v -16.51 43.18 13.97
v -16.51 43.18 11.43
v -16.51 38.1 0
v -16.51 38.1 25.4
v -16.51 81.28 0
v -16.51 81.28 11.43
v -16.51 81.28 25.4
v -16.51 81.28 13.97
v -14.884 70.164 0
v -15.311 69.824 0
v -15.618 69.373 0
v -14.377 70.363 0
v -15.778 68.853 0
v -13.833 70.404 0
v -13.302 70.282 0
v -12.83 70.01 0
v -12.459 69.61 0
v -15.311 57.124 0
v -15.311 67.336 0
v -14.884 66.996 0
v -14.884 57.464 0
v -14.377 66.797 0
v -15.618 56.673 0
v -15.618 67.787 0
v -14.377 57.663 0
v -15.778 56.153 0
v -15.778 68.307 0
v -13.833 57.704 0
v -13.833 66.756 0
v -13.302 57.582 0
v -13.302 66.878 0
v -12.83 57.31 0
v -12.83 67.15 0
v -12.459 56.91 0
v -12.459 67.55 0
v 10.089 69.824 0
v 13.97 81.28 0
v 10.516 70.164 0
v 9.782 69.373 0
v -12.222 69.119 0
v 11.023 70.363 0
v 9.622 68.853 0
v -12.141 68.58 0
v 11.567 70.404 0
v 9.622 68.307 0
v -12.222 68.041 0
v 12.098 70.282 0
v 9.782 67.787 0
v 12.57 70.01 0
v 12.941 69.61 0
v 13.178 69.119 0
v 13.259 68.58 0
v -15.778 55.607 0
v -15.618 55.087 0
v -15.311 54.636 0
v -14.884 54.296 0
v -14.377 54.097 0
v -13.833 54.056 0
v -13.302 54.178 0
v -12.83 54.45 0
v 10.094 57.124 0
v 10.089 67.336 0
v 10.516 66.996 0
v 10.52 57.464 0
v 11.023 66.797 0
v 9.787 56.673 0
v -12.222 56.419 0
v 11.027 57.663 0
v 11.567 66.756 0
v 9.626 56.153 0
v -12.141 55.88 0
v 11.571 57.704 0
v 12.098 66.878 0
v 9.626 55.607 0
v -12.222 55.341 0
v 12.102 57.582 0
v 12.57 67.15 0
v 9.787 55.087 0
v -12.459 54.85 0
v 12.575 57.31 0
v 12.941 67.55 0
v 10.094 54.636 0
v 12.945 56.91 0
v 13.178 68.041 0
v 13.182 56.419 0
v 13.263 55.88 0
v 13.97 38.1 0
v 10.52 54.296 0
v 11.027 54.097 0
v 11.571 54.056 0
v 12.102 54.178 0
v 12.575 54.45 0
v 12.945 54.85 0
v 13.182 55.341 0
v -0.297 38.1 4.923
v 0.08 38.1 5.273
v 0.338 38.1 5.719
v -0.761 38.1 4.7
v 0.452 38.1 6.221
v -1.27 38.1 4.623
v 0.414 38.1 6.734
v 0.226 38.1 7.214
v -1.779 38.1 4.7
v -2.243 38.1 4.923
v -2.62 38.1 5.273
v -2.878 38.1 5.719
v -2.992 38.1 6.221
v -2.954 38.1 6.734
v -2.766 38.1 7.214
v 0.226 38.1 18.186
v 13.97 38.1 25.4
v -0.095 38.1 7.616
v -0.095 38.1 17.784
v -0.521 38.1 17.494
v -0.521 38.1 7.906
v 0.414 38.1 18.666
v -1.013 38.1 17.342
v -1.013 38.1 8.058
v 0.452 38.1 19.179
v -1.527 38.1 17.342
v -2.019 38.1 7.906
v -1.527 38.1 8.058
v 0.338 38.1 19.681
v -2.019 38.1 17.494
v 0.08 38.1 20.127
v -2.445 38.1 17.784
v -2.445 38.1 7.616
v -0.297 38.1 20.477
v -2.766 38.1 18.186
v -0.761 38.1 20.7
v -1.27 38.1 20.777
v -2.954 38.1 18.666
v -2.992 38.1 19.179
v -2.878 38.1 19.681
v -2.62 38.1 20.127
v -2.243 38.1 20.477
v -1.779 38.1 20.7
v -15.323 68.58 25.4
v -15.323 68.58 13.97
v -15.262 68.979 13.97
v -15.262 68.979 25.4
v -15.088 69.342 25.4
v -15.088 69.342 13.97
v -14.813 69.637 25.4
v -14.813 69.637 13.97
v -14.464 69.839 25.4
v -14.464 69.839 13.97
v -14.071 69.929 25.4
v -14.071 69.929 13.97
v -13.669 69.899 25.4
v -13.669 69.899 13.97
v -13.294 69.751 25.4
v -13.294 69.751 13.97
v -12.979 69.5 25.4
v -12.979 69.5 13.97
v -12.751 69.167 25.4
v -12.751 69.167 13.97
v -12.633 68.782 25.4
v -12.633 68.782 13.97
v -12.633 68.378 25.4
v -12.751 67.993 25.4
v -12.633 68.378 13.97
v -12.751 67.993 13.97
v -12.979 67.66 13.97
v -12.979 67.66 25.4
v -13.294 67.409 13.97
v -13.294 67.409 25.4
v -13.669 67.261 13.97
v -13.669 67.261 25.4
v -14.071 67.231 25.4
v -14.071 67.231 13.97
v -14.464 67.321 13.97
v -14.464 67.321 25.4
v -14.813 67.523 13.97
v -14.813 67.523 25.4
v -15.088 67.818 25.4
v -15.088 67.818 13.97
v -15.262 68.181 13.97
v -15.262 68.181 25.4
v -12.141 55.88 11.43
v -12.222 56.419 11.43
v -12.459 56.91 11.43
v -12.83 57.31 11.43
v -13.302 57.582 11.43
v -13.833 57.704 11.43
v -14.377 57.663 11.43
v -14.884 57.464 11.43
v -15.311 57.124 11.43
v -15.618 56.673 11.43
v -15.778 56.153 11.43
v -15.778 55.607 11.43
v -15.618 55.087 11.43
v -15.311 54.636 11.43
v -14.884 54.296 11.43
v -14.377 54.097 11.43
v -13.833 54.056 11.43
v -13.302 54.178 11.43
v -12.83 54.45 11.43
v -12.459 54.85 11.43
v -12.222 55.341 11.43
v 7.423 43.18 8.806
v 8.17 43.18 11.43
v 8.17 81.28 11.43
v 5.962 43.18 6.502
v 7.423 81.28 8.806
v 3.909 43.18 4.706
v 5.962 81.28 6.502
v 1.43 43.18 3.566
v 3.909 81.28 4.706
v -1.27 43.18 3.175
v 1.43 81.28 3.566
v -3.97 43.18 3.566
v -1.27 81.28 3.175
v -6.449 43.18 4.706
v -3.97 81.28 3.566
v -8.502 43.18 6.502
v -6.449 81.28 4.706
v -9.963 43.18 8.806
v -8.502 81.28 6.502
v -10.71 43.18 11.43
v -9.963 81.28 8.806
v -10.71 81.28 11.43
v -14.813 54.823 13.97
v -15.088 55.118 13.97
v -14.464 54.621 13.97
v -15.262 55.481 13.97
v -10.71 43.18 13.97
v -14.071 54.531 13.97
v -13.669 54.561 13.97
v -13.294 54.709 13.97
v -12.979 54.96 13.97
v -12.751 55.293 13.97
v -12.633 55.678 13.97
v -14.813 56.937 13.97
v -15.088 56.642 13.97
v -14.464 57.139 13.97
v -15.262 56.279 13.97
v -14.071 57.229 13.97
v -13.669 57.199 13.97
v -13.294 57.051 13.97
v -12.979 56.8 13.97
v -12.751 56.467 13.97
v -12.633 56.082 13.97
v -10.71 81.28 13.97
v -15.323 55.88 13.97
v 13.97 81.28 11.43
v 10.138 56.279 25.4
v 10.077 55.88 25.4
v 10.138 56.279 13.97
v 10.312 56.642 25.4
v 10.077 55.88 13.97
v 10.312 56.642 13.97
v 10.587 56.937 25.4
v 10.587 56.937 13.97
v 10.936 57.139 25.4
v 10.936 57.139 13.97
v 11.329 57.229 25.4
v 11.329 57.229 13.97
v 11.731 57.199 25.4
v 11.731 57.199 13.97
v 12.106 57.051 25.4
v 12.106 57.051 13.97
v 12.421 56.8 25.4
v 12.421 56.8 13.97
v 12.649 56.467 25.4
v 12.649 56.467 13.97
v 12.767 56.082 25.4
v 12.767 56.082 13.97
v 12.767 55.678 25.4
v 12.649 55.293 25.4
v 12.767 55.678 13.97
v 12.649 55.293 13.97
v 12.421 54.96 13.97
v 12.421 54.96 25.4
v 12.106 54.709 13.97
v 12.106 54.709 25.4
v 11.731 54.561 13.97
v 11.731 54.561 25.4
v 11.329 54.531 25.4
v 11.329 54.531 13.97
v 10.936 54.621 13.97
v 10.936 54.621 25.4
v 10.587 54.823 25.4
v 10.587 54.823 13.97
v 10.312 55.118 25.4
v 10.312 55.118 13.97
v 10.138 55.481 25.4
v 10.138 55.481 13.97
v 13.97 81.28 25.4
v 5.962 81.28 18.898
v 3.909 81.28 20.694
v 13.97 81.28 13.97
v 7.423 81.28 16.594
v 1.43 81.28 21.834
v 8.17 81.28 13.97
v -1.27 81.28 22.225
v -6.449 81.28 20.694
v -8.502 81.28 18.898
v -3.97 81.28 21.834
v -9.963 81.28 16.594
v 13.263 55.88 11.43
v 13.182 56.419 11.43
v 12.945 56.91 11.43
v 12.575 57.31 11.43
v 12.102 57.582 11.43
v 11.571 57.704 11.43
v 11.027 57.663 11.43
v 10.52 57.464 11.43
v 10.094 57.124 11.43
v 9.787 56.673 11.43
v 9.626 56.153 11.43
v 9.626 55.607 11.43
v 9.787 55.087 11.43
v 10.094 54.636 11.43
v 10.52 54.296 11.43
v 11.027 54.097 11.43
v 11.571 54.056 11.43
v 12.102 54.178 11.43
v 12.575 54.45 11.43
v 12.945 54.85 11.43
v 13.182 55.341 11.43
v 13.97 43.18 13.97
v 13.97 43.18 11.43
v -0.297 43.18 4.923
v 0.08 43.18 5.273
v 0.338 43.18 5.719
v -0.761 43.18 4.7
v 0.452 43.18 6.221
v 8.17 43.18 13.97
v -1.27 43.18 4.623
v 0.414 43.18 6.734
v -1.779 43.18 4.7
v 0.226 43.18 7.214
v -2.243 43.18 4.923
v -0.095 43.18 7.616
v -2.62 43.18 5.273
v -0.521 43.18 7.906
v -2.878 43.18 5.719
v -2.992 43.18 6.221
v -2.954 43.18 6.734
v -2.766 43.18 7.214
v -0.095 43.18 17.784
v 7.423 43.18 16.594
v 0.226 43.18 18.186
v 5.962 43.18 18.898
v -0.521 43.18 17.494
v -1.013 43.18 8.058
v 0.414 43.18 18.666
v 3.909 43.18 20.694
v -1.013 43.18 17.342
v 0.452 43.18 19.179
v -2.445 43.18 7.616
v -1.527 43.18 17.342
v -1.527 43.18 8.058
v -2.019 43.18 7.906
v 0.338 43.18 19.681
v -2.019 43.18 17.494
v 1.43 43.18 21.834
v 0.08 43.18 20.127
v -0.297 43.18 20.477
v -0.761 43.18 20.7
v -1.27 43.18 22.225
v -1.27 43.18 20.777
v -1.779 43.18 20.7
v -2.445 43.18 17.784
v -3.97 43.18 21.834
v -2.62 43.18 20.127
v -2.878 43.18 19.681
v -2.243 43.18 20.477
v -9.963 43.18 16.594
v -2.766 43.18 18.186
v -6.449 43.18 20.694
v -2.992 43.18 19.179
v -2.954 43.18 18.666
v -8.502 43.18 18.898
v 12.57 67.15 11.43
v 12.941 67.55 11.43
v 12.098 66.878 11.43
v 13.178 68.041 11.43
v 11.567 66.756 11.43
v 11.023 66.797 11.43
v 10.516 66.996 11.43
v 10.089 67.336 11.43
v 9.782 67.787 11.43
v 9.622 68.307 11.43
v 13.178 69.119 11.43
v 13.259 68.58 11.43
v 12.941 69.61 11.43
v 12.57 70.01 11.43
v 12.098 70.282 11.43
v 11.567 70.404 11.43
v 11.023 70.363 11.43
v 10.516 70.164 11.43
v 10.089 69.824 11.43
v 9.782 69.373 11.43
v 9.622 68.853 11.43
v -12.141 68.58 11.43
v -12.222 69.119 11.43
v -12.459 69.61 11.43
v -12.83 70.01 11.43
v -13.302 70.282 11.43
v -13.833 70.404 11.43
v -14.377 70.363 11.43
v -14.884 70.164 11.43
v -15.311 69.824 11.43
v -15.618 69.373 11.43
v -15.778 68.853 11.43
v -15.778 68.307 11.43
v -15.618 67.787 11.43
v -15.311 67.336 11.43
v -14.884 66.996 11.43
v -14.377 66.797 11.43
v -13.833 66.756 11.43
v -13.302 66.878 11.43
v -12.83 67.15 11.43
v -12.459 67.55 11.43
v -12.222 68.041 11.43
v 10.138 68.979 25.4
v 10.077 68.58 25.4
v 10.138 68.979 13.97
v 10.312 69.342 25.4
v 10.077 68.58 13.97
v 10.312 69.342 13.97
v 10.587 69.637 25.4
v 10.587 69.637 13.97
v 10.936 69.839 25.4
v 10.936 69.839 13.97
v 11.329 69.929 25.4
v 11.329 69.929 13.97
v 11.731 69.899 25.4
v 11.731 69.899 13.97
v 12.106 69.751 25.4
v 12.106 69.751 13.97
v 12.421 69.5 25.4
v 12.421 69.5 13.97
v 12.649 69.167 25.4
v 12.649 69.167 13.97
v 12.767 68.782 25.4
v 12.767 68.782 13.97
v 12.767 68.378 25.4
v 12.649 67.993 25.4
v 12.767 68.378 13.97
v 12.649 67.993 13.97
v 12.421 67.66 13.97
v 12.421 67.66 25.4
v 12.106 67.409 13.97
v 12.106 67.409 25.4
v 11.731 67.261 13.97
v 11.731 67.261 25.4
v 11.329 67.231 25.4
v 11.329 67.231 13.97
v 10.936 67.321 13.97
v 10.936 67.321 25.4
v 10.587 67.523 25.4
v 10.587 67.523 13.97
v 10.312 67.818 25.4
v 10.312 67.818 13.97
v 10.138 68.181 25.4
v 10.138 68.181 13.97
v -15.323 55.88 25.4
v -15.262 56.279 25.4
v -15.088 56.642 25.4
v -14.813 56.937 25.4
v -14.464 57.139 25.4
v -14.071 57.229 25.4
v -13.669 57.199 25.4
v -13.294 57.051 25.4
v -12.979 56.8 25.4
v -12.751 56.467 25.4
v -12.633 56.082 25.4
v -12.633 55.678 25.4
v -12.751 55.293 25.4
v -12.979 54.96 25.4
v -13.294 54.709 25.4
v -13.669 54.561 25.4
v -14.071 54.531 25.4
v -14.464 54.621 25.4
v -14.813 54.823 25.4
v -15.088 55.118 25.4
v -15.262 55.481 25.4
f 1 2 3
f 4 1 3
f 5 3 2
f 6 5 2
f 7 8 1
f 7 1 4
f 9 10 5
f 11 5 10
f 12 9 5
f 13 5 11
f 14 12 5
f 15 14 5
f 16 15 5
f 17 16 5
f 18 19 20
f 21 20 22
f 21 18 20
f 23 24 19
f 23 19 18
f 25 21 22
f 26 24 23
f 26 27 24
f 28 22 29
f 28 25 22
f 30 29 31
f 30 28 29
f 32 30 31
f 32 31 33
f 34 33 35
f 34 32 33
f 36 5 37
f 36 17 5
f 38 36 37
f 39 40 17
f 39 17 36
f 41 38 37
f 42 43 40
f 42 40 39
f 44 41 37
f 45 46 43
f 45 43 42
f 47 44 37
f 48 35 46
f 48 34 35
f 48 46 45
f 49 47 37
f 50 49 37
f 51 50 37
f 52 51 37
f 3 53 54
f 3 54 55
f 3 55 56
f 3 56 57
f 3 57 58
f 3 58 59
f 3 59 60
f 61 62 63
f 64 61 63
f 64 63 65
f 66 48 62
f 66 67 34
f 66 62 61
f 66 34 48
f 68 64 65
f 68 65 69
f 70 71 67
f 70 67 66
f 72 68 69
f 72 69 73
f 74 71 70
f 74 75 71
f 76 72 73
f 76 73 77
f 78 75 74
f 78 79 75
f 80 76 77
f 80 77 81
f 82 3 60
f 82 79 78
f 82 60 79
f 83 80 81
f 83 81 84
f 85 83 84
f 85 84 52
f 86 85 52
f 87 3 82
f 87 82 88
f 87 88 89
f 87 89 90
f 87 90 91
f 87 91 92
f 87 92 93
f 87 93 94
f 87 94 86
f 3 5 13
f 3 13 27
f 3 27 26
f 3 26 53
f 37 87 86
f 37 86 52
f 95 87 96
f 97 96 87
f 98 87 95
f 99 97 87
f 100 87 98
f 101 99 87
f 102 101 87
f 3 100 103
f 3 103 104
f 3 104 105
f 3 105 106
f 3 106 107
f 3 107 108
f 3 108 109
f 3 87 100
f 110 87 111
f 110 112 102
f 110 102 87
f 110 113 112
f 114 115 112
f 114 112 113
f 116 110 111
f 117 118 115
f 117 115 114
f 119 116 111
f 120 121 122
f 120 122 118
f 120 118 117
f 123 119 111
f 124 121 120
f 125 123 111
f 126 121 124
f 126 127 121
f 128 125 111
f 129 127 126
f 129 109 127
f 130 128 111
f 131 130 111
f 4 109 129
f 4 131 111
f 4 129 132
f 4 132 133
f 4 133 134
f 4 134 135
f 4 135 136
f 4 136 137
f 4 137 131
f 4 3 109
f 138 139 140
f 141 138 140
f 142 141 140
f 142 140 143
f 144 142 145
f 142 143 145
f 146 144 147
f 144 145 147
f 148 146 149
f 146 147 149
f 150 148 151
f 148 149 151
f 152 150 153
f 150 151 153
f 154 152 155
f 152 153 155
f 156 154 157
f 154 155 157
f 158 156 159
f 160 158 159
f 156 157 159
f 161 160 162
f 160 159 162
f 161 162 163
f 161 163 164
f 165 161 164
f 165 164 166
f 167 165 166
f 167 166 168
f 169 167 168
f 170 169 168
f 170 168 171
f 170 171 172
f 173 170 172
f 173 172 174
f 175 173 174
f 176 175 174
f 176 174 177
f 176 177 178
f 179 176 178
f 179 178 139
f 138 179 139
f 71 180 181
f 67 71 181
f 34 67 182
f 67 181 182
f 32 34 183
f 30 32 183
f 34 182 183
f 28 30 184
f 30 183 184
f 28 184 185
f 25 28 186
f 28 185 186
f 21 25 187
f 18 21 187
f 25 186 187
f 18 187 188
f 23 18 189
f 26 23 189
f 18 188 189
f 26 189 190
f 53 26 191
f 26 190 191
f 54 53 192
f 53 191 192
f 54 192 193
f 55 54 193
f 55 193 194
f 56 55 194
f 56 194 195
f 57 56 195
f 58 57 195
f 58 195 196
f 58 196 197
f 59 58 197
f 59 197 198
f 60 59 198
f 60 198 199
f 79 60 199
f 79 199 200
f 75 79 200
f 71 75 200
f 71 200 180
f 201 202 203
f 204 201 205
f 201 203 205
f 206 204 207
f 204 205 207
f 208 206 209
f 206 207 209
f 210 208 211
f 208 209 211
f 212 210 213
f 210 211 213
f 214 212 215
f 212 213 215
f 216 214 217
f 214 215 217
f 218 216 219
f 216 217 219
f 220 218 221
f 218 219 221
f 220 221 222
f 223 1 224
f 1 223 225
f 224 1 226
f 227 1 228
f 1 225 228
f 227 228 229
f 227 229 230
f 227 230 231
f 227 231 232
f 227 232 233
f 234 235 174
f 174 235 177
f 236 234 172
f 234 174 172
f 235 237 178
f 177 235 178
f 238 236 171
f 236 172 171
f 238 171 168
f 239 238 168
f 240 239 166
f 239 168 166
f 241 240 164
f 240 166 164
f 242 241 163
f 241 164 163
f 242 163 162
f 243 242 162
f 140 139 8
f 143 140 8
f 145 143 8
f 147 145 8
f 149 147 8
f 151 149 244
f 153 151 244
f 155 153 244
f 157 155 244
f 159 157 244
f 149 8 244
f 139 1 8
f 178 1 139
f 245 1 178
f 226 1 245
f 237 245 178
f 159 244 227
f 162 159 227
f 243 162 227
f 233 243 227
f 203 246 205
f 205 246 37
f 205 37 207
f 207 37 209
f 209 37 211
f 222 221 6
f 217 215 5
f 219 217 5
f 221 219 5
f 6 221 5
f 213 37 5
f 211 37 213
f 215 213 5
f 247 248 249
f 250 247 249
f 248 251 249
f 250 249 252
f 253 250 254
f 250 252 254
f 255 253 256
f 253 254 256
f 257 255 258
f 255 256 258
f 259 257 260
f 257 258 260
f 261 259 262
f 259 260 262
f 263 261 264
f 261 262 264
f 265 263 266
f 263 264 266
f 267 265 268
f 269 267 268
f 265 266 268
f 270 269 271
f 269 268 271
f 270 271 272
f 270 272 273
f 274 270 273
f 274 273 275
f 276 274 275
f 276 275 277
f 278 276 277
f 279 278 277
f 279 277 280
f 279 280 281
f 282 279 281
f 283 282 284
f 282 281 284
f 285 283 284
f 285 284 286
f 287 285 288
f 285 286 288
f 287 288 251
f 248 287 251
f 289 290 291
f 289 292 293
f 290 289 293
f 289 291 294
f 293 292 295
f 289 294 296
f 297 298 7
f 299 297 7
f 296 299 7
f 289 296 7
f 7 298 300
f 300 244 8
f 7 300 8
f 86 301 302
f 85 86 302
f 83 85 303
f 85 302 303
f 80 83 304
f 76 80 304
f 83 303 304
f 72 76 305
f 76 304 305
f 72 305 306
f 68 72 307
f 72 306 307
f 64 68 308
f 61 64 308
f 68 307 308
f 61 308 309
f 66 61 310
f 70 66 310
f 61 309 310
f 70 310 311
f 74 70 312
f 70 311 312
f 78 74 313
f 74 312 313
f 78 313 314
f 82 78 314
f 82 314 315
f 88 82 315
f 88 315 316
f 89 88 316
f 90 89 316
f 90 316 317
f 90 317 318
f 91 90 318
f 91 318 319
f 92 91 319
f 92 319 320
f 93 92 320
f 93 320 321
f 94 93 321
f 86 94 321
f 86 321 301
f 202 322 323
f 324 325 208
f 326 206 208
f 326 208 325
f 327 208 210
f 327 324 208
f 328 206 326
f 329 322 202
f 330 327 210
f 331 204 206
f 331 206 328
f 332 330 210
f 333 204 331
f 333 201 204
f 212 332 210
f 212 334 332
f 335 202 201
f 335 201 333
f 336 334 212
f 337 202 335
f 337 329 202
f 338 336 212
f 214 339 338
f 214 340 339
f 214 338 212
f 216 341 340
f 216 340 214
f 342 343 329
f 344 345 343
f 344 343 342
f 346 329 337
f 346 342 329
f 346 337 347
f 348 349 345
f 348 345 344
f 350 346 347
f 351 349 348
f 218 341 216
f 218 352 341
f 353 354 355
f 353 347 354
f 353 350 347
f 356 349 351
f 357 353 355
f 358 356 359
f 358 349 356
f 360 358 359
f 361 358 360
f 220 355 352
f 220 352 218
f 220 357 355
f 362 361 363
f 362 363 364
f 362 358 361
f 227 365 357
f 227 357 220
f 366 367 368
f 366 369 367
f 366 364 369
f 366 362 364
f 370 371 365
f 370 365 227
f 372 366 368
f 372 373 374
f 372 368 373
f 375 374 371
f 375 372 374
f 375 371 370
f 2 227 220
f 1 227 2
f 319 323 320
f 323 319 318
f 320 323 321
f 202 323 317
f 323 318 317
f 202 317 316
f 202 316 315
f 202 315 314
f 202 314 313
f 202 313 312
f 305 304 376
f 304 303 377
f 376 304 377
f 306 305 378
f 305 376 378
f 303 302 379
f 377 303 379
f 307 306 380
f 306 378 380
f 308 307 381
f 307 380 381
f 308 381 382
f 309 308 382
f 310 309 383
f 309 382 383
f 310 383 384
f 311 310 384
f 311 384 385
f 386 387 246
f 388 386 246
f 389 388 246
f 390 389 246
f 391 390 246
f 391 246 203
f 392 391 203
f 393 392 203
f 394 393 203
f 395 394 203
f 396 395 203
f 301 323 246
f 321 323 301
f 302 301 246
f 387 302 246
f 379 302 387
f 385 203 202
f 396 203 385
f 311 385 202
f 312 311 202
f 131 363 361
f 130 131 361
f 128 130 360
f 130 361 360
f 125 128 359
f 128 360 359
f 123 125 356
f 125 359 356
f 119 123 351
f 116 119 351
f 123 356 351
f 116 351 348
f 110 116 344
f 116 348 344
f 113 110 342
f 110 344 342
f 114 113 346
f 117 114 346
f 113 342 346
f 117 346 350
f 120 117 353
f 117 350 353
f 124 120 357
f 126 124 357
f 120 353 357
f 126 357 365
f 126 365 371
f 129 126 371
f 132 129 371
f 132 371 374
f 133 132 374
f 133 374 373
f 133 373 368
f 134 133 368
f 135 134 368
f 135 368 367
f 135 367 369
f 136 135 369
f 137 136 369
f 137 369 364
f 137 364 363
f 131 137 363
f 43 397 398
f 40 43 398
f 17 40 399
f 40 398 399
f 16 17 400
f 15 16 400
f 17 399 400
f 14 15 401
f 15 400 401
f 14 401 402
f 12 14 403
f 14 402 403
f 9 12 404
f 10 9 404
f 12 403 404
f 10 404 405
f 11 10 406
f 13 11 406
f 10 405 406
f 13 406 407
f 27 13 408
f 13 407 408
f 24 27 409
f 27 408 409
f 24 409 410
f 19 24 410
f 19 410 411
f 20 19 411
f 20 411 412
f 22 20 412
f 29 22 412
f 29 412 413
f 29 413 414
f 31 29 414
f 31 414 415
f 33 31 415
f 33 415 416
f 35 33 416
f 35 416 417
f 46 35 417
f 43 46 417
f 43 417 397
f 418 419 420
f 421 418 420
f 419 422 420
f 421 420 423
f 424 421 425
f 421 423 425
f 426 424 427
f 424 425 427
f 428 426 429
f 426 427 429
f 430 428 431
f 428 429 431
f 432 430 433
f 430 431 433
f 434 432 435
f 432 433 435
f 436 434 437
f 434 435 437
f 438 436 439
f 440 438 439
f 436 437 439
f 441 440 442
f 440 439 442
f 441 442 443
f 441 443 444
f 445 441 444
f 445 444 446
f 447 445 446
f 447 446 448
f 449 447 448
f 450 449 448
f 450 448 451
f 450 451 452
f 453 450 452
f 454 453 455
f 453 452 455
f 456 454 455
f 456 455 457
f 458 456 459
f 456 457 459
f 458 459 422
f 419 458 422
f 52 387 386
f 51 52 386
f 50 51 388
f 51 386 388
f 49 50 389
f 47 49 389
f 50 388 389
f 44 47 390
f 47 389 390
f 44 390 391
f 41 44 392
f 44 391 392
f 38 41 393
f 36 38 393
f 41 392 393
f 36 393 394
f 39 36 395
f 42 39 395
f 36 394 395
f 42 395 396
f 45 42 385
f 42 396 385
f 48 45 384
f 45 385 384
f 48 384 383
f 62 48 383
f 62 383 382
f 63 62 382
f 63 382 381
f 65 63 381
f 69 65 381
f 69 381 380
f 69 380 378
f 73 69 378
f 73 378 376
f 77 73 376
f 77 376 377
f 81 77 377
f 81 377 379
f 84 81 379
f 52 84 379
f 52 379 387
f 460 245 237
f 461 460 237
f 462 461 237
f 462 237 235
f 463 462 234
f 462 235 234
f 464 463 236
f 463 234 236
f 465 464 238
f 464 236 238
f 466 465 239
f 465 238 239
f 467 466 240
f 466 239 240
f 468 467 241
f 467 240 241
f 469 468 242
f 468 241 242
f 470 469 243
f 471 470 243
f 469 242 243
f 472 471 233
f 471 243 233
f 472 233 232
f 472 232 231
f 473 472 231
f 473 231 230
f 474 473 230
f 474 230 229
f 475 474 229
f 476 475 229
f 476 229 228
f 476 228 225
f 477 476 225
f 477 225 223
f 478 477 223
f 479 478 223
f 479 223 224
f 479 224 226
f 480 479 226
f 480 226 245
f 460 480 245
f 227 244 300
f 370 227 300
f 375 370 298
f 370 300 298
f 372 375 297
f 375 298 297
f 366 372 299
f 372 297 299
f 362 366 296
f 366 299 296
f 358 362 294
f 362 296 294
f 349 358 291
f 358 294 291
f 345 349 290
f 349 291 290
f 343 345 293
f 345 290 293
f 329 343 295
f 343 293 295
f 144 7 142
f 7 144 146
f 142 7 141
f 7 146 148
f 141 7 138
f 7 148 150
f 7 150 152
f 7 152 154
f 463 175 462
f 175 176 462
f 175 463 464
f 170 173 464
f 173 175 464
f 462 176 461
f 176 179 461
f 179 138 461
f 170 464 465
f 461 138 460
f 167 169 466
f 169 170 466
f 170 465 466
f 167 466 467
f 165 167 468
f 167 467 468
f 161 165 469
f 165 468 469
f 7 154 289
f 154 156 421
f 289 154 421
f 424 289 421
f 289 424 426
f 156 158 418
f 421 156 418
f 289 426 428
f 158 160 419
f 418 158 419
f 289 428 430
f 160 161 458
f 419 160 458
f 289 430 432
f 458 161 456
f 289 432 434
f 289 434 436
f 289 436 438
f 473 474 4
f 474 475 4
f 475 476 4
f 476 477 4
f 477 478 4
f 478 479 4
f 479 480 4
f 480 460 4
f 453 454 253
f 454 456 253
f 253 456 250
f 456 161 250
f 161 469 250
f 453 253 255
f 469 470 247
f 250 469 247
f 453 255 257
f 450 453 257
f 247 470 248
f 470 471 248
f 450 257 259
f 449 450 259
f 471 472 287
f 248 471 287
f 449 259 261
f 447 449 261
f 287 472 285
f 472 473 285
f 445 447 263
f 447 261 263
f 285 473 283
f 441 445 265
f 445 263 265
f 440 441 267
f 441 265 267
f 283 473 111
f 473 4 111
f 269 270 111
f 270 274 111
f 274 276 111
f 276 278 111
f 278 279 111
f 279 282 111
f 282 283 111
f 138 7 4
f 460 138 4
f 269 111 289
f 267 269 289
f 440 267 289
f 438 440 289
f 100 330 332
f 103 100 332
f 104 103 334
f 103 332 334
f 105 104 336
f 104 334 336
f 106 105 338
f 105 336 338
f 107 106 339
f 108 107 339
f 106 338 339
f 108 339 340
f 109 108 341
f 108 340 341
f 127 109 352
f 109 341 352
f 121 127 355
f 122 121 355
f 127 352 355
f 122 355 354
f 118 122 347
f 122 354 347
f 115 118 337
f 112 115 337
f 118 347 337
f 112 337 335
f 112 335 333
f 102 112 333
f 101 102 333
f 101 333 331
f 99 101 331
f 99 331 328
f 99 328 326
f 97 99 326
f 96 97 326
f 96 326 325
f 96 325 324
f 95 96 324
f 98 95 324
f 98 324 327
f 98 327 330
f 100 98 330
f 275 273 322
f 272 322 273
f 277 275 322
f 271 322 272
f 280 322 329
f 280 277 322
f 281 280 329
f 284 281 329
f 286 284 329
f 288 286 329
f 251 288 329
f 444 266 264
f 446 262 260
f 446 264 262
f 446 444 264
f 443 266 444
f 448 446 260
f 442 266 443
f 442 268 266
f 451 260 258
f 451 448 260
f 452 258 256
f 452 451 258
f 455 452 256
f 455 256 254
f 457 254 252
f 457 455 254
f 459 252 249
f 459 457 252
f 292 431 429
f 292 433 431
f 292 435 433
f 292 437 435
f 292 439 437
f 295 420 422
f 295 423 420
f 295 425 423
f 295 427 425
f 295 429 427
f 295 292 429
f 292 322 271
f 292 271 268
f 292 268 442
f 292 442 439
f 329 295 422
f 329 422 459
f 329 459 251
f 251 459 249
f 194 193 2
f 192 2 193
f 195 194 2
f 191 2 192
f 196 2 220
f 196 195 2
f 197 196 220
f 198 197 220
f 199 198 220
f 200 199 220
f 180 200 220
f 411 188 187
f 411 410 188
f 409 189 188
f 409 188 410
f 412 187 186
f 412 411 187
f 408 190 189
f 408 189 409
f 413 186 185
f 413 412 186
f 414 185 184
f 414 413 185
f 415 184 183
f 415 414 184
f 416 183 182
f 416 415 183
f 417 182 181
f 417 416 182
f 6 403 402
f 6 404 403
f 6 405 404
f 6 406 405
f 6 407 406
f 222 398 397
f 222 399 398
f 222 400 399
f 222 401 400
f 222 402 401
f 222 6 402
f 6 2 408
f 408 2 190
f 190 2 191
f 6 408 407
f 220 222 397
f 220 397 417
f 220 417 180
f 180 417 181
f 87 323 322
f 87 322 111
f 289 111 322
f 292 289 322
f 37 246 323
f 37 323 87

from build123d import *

# Parameters (mm, degrees)
SKETCH1_W                       = 55.88
SKETCH1_H                       = 25.4
EXTRUDE1_DEPTH                  = 101.6
SKETCH4_R                       = 9.525
CUT_EXTRUDE2_DEPTH              = 58.42
SKETCH7_W                       = 25.4
SKETCH7_H                       = 101.6
CUT_EXTRUDE5_DEPTH              = 12.7
SKETCH8_W                       = 25.4
SKETCH8_H                       = 101.6
CUT_EXTRUDE6_DEPTH              = 12.7
SKETCH15_W                      = 5.800046345
SKETCH15_H                      = 2.54
CUT_EXTRUDE10_DEPTH             = 58.42
F_27_0_144_DIAMETER_HOLE1_D     = 3.6576
F_27_0_144_DIAMETER_HOLE1_DEPTH = 13.97
F_27_0_144_DIAMETER_HOLE2_D     = 3.6576
F_27_0_144_DIAMETER_HOLE2_DEPTH = 13.97
F_6_32_TAPPED_HOLE1_D           = 2.7051
F_6_32_TAPPED_HOLE1_DEPTH       = 11.43
F_6_32_TAPPED_HOLE1_TIP         = 0.81269403
F_6_32_TAPPED_HOLE2_D           = 2.7051
F_6_32_TAPPED_HOLE2_DEPTH       = 11.43
F_6_32_TAPPED_HOLE2_TIP         = 0.81269403
SKETCH37_W                      = 25.4
SKETCH37_H                      = 38.1
CUT_EXTRUDE11_DEPTH             = 114.279443855
F_8_32_TAPPED_HOLE3_D           = 3.4544
CIRPATTERN2_COUNT               = 2
SKETCH44_W                      = 30.48
SKETCH44_H                      = 20.32
CUT_EXTRUDE12_DEPTH             = 107.02028155
CIRPATTERN3_COUNT               = 2
F_6_32_TAPPED_HOLE3_D           = 2.7051
F_6_32_TAPPED_HOLE3_DEPTH       = 13.97
F_6_32_TAPPED_HOLE4_D           = 2.7051
F_6_32_TAPPED_HOLE4_DEPTH       = 13.97
F_27_0_144_DIAMETER_HOLE3_D     = 3.6576
F_27_0_144_DIAMETER_HOLE3_DEPTH = 13.97
F_27_0_144_DIAMETER_HOLE4_D     = 3.6576
F_27_0_144_DIAMETER_HOLE4_DEPTH = 13.97


with BuildPart() as part:
    # Sketch1 → Extrude1 (new body)
    with BuildSketch(Plane(origin=(0, 0, 0), x_dir=(1, 0, 0), z_dir=(0, 1, 0))):
        with Locations((-1.27, -12.7)):
            Rectangle(SKETCH1_W, SKETCH1_H)
    extrude(amount=EXTRUDE1_DEPTH)

    # Sketch4 → Cut-Extrude2 (cut)
    with BuildSketch(Plane(origin=(0, 101.6, 0), x_dir=(-1, 0, 0), z_dir=(0, 1, 0))):
        with Locations(Location((1.27, 12.7, 0), (0, 0, 90))):
            Circle(SKETCH4_R)
    extrude(amount=-CUT_EXTRUDE2_DEPTH, mode=Mode.SUBTRACT)

    # Sketch7 → Cut-Extrude5 (cut)
    with BuildSketch(Plane(origin=(26.67, 0, 0), x_dir=(0, 0, -1), z_dir=(1, 0, 0))):
        with Locations((-12.7, 50.8)):
            Rectangle(SKETCH7_W, SKETCH7_H)
    extrude(amount=-CUT_EXTRUDE5_DEPTH, mode=Mode.SUBTRACT)

    # Sketch8 → Cut-Extrude6 (cut)
    with BuildSketch(Plane.ZY.offset(29.21)):
        with Locations((12.7, 50.8)):
            Rectangle(SKETCH8_W, SKETCH8_H)
    extrude(amount=-CUT_EXTRUDE6_DEPTH, mode=Mode.SUBTRACT)

    # Sketch15 → Cut-Extrude10 (cut)
    with BuildSketch(Plane(origin=(0, 101.6, 0), x_dir=(-1, 0, 0), z_dir=(0, 1, 0))):
        with Locations((-11.069976827, 12.7)):
            Rectangle(SKETCH15_W, SKETCH15_H)
    cut_extrude10 = extrude(amount=-CUT_EXTRUDE10_DEPTH, mode=Mode.SUBTRACT)

    # #27 (0.144) Diameter Hole1
    with Locations(Plane(origin=(11.43, 68.58, 0), x_dir=(-1, 0, 0), z_dir=(0, 0, -1))):
        with Locations((0, 0)):
            Hole(F_27_0_144_DIAMETER_HOLE1_D / 2, depth=F_27_0_144_DIAMETER_HOLE1_DEPTH)

    # #27 (0.144) Diameter Hole2
    with Locations(Plane(origin=(11.434321399, 55.88, 0), x_dir=(-1, 0, 0), z_dir=(0, 0, -1))):
        with Locations((0, 0)):
            Hole(F_27_0_144_DIAMETER_HOLE2_D / 2, depth=F_27_0_144_DIAMETER_HOLE2_DEPTH)

    # #6-32 Tapped Hole1
    with Locations(Plane(origin=(11.43, 68.58, 25.4), x_dir=(1, 0, 0), z_dir=(0, 0, 1))):
        with Locations((0, 0)):
            Hole(F_6_32_TAPPED_HOLE1_D / 2, depth=F_6_32_TAPPED_HOLE1_DEPTH)
            with Locations((0, 0, -(F_6_32_TAPPED_HOLE1_DEPTH + F_6_32_TAPPED_HOLE1_TIP / 2))):  # 118° drill point
                Cone(0, F_6_32_TAPPED_HOLE1_D / 2, F_6_32_TAPPED_HOLE1_TIP, mode=Mode.SUBTRACT)

    # #6-32 Tapped Hole2
    with Locations(Plane(origin=(11.43, 55.88, 25.4), x_dir=(1, 0, 0), z_dir=(0, 0, 1))):
        with Locations((0, 0)):
            Hole(F_6_32_TAPPED_HOLE2_D / 2, depth=F_6_32_TAPPED_HOLE2_DEPTH)
            with Locations((0, 0, -(F_6_32_TAPPED_HOLE2_DEPTH + F_6_32_TAPPED_HOLE2_TIP / 2))):  # 118° drill point
                Cone(0, F_6_32_TAPPED_HOLE2_D / 2, F_6_32_TAPPED_HOLE2_TIP, mode=Mode.SUBTRACT)

    # Sketch37 → Cut-Extrude11 (cut, through all)
    with BuildSketch(Plane.ZY.offset(29.21)):
        with Locations((12.7, 19.05)):
            Rectangle(SKETCH37_W, SKETCH37_H)
    extrude(amount=-CUT_EXTRUDE11_DEPTH, mode=Mode.SUBTRACT)

    # #8-32 Tapped Hole3 (through all)
    with Locations(Plane(origin=(-1.27, 38.1, 19.05), x_dir=(0, 0, -1), z_dir=(0, -1, 0))):
        with Locations((0, 0)):
            f_8_32_tapped_hole3 = Hole(F_8_32_TAPPED_HOLE3_D / 2)

    # CirPattern2: #8-32 Tapped Hole3 ×2 about axis
    cirpattern2_axis = Axis((-1.27, 0, 12.7), (0, 1, 0))
    for i in range(1, CIRPATTERN2_COUNT):
        add(f_8_32_tapped_hole3.rotate(cirpattern2_axis, i * 360 / CIRPATTERN2_COUNT), mode=Mode.SUBTRACT)

    # Sketch44 → Cut-Extrude12 (cut, through all)
    with BuildSketch(Plane(origin=(0, 0, 0), x_dir=(-1, 0, 0), z_dir=(0, 0, -1))):
        with Locations((1.27, 91.44)):
            Rectangle(SKETCH44_W, SKETCH44_H)
    extrude(amount=-CUT_EXTRUDE12_DEPTH, mode=Mode.SUBTRACT)

    # CirPattern3: Cut-Extrude10 ×2 about axis
    cirpattern3_axis = Axis((-1.27, 87.197587188, 12.7), (0, 1, 0))
    for i in range(1, CIRPATTERN3_COUNT):
        add(cut_extrude10.rotate(cirpattern3_axis, i * 360 / CIRPATTERN3_COUNT), mode=Mode.SUBTRACT)

    # #6-32 Tapped Hole3
    with Locations(Plane(origin=(-13.97, 68.58, 25.4), x_dir=(1, 0, 0), z_dir=(0, 0, 1))):
        with Locations((0, 0)):
            Hole(F_6_32_TAPPED_HOLE3_D / 2, depth=F_6_32_TAPPED_HOLE3_DEPTH)

    # #6-32 Tapped Hole4
    with Locations(Plane(origin=(-13.97, 55.88, 25.4), x_dir=(1, 0, 0), z_dir=(0, 0, 1))):
        with Locations((0, 0)):
            Hole(F_6_32_TAPPED_HOLE4_D / 2, depth=F_6_32_TAPPED_HOLE4_DEPTH)

    # #27 (0.144) Diameter Hole3
    with Locations(Plane(origin=(-13.97, 68.58, 0), x_dir=(-1, 0, 0), z_dir=(0, 0, -1))):
        with Locations((0, 0)):
            Hole(F_27_0_144_DIAMETER_HOLE3_D / 2, depth=F_27_0_144_DIAMETER_HOLE3_DEPTH)

    # #27 (0.144) Diameter Hole4
    with Locations(Plane(origin=(-13.97, 55.88, 0), x_dir=(-1, 0, 0), z_dir=(0, 0, -1))):
        with Locations((0, 0)):
            Hole(F_27_0_144_DIAMETER_HOLE4_D / 2, depth=F_27_0_144_DIAMETER_HOLE4_DEPTH)


solid = part.part
